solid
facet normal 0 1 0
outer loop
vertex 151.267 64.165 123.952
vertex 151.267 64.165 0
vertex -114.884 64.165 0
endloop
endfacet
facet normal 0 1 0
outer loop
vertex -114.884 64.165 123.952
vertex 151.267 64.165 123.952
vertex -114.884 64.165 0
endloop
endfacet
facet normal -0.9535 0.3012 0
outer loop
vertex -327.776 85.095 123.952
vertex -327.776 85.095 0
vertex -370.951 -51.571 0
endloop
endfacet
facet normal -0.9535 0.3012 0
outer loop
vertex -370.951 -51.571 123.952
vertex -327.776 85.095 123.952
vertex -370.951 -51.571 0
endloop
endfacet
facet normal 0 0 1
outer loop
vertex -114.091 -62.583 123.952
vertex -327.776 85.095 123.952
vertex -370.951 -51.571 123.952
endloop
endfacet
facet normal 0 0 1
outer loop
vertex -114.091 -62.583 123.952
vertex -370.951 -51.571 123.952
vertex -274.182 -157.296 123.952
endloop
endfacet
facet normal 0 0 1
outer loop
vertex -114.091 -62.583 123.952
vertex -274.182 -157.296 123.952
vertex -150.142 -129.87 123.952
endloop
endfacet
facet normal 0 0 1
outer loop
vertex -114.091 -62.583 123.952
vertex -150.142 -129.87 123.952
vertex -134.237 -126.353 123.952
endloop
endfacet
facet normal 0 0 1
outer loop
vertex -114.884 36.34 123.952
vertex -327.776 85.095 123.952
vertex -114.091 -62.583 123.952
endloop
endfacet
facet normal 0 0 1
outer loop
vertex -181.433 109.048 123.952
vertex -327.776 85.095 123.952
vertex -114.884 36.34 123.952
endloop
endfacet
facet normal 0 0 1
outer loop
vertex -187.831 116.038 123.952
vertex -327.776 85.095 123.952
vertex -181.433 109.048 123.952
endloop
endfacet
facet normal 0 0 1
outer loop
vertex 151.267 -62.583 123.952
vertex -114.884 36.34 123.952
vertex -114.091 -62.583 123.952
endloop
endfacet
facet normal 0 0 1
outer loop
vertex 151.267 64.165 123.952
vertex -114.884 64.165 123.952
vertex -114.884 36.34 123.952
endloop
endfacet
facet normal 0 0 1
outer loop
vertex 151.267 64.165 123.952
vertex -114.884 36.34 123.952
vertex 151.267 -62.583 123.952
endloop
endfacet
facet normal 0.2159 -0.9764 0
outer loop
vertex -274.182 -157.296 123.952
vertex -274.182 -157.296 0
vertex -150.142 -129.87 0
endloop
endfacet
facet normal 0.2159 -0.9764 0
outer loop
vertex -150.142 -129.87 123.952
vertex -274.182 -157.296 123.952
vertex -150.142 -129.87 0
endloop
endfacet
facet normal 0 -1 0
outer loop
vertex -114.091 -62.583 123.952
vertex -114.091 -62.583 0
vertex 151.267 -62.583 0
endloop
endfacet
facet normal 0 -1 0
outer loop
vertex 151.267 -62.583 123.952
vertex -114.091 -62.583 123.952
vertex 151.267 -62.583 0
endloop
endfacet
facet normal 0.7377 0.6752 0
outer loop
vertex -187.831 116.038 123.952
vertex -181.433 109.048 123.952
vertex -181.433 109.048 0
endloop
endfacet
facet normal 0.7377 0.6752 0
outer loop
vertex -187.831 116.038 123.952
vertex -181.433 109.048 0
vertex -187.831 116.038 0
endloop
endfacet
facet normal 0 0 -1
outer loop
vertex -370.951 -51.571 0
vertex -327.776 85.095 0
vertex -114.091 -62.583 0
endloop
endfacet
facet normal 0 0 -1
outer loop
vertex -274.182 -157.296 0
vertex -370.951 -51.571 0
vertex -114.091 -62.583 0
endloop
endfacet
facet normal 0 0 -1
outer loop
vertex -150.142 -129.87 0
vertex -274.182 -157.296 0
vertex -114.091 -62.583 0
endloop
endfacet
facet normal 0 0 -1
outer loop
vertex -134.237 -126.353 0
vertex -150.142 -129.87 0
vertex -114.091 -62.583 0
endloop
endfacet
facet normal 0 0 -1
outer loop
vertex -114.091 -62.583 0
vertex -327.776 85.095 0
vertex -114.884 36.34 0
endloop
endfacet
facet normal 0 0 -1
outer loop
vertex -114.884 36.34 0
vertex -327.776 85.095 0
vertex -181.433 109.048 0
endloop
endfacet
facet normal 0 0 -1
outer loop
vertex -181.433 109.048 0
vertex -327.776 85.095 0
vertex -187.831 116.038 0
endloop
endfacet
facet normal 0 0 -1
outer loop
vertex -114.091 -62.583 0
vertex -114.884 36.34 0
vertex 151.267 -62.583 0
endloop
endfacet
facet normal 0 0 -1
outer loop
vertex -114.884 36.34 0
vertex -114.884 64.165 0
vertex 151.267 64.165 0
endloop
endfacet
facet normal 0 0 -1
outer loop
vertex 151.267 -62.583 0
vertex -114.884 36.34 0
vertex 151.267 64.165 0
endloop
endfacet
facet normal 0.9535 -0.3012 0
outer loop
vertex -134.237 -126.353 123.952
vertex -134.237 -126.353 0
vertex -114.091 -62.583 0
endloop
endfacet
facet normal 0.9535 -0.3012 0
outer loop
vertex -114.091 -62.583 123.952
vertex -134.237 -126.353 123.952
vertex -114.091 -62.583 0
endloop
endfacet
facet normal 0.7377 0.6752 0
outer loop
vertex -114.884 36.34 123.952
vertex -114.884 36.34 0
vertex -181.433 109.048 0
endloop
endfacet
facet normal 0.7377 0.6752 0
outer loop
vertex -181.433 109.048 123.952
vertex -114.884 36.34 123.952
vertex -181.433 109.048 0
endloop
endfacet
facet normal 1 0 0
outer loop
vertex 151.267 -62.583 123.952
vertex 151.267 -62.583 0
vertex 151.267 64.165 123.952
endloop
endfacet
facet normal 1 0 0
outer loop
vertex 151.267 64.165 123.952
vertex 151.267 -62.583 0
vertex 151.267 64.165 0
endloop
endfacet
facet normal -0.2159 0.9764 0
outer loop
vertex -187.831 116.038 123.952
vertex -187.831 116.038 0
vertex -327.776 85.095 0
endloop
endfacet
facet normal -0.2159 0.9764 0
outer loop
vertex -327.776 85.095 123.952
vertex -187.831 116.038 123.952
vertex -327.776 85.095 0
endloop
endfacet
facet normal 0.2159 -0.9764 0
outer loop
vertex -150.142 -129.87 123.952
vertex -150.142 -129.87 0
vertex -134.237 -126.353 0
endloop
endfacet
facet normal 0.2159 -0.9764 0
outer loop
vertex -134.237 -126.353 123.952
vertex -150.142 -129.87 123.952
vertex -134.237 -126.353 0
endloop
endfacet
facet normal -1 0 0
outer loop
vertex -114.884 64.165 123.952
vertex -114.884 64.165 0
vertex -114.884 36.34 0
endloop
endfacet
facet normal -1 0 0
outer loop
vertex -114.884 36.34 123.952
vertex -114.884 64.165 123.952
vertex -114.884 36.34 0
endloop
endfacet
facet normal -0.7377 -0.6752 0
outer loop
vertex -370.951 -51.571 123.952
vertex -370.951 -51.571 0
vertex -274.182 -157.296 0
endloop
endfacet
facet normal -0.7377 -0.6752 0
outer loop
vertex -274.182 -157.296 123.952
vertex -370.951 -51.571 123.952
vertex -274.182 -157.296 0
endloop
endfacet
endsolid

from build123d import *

# Parameters (mm, degrees)
BOSS_EXTRUDE1_DEPTH = 123.952


with BuildPart() as part:
    # Sketch1 → Boss-Extrude1 (new body)
    with BuildSketch(Plane.XY):
        with BuildLine():
            ThreePointArc((-150.141788754, -129.869756414), (-205.816359245, -15.653721009), (-181.433254288, 109.047621148))
            Line((-181.433254288, 109.047621148), (-187.831275189, 116.037713042))
            Line((-187.831275189, 116.037713042), (-327.77572694, 85.095221198))
            Line((-327.77572694, 85.095221198), (-370.950968822, -51.57147506))
            Line((-370.950968822, -51.57147506), (-274.181758953, -157.295679473))
            Line((-274.181758953, -157.295679473), (-150.141788754, -129.869756414))
        make_face()
        Polygon((151.2671863, 64.164969875), (-114.883967634, 64.164969875), (-114.883967634, 36.339882858), (-91.062065319, 10.313508629), (-114.09129189, -62.583090802), (151.2671863, -62.583090802), align=None)
        Polygon((-91.062065319, 10.313508629), (-114.883967634, 36.339882858), (-114.883967634, -62.583090802), (-114.09129189, -62.583090802), align=None)
        with BuildLine():
            Line((-114.883967634, -62.583090802), (-114.883967634, 36.339882858))
            Line((-114.883967634, 36.339882858), (-181.433254288, 109.047621148))
            ThreePointArc((-181.433254288, 109.047621148), (-205.816359245, -15.653721009), (-150.141788754, -129.869756414))
            Line((-150.141788754, -129.869756414), (-134.237307201, -126.353187629))
            Line((-134.237307201, -126.353187629), (-114.09129189, -62.583090802))
            Line((-114.09129189, -62.583090802), (-114.883967634, -62.583090802))
        make_face()
    extrude(amount=BOSS_EXTRUDE1_DEPTH)


solid = part.part
